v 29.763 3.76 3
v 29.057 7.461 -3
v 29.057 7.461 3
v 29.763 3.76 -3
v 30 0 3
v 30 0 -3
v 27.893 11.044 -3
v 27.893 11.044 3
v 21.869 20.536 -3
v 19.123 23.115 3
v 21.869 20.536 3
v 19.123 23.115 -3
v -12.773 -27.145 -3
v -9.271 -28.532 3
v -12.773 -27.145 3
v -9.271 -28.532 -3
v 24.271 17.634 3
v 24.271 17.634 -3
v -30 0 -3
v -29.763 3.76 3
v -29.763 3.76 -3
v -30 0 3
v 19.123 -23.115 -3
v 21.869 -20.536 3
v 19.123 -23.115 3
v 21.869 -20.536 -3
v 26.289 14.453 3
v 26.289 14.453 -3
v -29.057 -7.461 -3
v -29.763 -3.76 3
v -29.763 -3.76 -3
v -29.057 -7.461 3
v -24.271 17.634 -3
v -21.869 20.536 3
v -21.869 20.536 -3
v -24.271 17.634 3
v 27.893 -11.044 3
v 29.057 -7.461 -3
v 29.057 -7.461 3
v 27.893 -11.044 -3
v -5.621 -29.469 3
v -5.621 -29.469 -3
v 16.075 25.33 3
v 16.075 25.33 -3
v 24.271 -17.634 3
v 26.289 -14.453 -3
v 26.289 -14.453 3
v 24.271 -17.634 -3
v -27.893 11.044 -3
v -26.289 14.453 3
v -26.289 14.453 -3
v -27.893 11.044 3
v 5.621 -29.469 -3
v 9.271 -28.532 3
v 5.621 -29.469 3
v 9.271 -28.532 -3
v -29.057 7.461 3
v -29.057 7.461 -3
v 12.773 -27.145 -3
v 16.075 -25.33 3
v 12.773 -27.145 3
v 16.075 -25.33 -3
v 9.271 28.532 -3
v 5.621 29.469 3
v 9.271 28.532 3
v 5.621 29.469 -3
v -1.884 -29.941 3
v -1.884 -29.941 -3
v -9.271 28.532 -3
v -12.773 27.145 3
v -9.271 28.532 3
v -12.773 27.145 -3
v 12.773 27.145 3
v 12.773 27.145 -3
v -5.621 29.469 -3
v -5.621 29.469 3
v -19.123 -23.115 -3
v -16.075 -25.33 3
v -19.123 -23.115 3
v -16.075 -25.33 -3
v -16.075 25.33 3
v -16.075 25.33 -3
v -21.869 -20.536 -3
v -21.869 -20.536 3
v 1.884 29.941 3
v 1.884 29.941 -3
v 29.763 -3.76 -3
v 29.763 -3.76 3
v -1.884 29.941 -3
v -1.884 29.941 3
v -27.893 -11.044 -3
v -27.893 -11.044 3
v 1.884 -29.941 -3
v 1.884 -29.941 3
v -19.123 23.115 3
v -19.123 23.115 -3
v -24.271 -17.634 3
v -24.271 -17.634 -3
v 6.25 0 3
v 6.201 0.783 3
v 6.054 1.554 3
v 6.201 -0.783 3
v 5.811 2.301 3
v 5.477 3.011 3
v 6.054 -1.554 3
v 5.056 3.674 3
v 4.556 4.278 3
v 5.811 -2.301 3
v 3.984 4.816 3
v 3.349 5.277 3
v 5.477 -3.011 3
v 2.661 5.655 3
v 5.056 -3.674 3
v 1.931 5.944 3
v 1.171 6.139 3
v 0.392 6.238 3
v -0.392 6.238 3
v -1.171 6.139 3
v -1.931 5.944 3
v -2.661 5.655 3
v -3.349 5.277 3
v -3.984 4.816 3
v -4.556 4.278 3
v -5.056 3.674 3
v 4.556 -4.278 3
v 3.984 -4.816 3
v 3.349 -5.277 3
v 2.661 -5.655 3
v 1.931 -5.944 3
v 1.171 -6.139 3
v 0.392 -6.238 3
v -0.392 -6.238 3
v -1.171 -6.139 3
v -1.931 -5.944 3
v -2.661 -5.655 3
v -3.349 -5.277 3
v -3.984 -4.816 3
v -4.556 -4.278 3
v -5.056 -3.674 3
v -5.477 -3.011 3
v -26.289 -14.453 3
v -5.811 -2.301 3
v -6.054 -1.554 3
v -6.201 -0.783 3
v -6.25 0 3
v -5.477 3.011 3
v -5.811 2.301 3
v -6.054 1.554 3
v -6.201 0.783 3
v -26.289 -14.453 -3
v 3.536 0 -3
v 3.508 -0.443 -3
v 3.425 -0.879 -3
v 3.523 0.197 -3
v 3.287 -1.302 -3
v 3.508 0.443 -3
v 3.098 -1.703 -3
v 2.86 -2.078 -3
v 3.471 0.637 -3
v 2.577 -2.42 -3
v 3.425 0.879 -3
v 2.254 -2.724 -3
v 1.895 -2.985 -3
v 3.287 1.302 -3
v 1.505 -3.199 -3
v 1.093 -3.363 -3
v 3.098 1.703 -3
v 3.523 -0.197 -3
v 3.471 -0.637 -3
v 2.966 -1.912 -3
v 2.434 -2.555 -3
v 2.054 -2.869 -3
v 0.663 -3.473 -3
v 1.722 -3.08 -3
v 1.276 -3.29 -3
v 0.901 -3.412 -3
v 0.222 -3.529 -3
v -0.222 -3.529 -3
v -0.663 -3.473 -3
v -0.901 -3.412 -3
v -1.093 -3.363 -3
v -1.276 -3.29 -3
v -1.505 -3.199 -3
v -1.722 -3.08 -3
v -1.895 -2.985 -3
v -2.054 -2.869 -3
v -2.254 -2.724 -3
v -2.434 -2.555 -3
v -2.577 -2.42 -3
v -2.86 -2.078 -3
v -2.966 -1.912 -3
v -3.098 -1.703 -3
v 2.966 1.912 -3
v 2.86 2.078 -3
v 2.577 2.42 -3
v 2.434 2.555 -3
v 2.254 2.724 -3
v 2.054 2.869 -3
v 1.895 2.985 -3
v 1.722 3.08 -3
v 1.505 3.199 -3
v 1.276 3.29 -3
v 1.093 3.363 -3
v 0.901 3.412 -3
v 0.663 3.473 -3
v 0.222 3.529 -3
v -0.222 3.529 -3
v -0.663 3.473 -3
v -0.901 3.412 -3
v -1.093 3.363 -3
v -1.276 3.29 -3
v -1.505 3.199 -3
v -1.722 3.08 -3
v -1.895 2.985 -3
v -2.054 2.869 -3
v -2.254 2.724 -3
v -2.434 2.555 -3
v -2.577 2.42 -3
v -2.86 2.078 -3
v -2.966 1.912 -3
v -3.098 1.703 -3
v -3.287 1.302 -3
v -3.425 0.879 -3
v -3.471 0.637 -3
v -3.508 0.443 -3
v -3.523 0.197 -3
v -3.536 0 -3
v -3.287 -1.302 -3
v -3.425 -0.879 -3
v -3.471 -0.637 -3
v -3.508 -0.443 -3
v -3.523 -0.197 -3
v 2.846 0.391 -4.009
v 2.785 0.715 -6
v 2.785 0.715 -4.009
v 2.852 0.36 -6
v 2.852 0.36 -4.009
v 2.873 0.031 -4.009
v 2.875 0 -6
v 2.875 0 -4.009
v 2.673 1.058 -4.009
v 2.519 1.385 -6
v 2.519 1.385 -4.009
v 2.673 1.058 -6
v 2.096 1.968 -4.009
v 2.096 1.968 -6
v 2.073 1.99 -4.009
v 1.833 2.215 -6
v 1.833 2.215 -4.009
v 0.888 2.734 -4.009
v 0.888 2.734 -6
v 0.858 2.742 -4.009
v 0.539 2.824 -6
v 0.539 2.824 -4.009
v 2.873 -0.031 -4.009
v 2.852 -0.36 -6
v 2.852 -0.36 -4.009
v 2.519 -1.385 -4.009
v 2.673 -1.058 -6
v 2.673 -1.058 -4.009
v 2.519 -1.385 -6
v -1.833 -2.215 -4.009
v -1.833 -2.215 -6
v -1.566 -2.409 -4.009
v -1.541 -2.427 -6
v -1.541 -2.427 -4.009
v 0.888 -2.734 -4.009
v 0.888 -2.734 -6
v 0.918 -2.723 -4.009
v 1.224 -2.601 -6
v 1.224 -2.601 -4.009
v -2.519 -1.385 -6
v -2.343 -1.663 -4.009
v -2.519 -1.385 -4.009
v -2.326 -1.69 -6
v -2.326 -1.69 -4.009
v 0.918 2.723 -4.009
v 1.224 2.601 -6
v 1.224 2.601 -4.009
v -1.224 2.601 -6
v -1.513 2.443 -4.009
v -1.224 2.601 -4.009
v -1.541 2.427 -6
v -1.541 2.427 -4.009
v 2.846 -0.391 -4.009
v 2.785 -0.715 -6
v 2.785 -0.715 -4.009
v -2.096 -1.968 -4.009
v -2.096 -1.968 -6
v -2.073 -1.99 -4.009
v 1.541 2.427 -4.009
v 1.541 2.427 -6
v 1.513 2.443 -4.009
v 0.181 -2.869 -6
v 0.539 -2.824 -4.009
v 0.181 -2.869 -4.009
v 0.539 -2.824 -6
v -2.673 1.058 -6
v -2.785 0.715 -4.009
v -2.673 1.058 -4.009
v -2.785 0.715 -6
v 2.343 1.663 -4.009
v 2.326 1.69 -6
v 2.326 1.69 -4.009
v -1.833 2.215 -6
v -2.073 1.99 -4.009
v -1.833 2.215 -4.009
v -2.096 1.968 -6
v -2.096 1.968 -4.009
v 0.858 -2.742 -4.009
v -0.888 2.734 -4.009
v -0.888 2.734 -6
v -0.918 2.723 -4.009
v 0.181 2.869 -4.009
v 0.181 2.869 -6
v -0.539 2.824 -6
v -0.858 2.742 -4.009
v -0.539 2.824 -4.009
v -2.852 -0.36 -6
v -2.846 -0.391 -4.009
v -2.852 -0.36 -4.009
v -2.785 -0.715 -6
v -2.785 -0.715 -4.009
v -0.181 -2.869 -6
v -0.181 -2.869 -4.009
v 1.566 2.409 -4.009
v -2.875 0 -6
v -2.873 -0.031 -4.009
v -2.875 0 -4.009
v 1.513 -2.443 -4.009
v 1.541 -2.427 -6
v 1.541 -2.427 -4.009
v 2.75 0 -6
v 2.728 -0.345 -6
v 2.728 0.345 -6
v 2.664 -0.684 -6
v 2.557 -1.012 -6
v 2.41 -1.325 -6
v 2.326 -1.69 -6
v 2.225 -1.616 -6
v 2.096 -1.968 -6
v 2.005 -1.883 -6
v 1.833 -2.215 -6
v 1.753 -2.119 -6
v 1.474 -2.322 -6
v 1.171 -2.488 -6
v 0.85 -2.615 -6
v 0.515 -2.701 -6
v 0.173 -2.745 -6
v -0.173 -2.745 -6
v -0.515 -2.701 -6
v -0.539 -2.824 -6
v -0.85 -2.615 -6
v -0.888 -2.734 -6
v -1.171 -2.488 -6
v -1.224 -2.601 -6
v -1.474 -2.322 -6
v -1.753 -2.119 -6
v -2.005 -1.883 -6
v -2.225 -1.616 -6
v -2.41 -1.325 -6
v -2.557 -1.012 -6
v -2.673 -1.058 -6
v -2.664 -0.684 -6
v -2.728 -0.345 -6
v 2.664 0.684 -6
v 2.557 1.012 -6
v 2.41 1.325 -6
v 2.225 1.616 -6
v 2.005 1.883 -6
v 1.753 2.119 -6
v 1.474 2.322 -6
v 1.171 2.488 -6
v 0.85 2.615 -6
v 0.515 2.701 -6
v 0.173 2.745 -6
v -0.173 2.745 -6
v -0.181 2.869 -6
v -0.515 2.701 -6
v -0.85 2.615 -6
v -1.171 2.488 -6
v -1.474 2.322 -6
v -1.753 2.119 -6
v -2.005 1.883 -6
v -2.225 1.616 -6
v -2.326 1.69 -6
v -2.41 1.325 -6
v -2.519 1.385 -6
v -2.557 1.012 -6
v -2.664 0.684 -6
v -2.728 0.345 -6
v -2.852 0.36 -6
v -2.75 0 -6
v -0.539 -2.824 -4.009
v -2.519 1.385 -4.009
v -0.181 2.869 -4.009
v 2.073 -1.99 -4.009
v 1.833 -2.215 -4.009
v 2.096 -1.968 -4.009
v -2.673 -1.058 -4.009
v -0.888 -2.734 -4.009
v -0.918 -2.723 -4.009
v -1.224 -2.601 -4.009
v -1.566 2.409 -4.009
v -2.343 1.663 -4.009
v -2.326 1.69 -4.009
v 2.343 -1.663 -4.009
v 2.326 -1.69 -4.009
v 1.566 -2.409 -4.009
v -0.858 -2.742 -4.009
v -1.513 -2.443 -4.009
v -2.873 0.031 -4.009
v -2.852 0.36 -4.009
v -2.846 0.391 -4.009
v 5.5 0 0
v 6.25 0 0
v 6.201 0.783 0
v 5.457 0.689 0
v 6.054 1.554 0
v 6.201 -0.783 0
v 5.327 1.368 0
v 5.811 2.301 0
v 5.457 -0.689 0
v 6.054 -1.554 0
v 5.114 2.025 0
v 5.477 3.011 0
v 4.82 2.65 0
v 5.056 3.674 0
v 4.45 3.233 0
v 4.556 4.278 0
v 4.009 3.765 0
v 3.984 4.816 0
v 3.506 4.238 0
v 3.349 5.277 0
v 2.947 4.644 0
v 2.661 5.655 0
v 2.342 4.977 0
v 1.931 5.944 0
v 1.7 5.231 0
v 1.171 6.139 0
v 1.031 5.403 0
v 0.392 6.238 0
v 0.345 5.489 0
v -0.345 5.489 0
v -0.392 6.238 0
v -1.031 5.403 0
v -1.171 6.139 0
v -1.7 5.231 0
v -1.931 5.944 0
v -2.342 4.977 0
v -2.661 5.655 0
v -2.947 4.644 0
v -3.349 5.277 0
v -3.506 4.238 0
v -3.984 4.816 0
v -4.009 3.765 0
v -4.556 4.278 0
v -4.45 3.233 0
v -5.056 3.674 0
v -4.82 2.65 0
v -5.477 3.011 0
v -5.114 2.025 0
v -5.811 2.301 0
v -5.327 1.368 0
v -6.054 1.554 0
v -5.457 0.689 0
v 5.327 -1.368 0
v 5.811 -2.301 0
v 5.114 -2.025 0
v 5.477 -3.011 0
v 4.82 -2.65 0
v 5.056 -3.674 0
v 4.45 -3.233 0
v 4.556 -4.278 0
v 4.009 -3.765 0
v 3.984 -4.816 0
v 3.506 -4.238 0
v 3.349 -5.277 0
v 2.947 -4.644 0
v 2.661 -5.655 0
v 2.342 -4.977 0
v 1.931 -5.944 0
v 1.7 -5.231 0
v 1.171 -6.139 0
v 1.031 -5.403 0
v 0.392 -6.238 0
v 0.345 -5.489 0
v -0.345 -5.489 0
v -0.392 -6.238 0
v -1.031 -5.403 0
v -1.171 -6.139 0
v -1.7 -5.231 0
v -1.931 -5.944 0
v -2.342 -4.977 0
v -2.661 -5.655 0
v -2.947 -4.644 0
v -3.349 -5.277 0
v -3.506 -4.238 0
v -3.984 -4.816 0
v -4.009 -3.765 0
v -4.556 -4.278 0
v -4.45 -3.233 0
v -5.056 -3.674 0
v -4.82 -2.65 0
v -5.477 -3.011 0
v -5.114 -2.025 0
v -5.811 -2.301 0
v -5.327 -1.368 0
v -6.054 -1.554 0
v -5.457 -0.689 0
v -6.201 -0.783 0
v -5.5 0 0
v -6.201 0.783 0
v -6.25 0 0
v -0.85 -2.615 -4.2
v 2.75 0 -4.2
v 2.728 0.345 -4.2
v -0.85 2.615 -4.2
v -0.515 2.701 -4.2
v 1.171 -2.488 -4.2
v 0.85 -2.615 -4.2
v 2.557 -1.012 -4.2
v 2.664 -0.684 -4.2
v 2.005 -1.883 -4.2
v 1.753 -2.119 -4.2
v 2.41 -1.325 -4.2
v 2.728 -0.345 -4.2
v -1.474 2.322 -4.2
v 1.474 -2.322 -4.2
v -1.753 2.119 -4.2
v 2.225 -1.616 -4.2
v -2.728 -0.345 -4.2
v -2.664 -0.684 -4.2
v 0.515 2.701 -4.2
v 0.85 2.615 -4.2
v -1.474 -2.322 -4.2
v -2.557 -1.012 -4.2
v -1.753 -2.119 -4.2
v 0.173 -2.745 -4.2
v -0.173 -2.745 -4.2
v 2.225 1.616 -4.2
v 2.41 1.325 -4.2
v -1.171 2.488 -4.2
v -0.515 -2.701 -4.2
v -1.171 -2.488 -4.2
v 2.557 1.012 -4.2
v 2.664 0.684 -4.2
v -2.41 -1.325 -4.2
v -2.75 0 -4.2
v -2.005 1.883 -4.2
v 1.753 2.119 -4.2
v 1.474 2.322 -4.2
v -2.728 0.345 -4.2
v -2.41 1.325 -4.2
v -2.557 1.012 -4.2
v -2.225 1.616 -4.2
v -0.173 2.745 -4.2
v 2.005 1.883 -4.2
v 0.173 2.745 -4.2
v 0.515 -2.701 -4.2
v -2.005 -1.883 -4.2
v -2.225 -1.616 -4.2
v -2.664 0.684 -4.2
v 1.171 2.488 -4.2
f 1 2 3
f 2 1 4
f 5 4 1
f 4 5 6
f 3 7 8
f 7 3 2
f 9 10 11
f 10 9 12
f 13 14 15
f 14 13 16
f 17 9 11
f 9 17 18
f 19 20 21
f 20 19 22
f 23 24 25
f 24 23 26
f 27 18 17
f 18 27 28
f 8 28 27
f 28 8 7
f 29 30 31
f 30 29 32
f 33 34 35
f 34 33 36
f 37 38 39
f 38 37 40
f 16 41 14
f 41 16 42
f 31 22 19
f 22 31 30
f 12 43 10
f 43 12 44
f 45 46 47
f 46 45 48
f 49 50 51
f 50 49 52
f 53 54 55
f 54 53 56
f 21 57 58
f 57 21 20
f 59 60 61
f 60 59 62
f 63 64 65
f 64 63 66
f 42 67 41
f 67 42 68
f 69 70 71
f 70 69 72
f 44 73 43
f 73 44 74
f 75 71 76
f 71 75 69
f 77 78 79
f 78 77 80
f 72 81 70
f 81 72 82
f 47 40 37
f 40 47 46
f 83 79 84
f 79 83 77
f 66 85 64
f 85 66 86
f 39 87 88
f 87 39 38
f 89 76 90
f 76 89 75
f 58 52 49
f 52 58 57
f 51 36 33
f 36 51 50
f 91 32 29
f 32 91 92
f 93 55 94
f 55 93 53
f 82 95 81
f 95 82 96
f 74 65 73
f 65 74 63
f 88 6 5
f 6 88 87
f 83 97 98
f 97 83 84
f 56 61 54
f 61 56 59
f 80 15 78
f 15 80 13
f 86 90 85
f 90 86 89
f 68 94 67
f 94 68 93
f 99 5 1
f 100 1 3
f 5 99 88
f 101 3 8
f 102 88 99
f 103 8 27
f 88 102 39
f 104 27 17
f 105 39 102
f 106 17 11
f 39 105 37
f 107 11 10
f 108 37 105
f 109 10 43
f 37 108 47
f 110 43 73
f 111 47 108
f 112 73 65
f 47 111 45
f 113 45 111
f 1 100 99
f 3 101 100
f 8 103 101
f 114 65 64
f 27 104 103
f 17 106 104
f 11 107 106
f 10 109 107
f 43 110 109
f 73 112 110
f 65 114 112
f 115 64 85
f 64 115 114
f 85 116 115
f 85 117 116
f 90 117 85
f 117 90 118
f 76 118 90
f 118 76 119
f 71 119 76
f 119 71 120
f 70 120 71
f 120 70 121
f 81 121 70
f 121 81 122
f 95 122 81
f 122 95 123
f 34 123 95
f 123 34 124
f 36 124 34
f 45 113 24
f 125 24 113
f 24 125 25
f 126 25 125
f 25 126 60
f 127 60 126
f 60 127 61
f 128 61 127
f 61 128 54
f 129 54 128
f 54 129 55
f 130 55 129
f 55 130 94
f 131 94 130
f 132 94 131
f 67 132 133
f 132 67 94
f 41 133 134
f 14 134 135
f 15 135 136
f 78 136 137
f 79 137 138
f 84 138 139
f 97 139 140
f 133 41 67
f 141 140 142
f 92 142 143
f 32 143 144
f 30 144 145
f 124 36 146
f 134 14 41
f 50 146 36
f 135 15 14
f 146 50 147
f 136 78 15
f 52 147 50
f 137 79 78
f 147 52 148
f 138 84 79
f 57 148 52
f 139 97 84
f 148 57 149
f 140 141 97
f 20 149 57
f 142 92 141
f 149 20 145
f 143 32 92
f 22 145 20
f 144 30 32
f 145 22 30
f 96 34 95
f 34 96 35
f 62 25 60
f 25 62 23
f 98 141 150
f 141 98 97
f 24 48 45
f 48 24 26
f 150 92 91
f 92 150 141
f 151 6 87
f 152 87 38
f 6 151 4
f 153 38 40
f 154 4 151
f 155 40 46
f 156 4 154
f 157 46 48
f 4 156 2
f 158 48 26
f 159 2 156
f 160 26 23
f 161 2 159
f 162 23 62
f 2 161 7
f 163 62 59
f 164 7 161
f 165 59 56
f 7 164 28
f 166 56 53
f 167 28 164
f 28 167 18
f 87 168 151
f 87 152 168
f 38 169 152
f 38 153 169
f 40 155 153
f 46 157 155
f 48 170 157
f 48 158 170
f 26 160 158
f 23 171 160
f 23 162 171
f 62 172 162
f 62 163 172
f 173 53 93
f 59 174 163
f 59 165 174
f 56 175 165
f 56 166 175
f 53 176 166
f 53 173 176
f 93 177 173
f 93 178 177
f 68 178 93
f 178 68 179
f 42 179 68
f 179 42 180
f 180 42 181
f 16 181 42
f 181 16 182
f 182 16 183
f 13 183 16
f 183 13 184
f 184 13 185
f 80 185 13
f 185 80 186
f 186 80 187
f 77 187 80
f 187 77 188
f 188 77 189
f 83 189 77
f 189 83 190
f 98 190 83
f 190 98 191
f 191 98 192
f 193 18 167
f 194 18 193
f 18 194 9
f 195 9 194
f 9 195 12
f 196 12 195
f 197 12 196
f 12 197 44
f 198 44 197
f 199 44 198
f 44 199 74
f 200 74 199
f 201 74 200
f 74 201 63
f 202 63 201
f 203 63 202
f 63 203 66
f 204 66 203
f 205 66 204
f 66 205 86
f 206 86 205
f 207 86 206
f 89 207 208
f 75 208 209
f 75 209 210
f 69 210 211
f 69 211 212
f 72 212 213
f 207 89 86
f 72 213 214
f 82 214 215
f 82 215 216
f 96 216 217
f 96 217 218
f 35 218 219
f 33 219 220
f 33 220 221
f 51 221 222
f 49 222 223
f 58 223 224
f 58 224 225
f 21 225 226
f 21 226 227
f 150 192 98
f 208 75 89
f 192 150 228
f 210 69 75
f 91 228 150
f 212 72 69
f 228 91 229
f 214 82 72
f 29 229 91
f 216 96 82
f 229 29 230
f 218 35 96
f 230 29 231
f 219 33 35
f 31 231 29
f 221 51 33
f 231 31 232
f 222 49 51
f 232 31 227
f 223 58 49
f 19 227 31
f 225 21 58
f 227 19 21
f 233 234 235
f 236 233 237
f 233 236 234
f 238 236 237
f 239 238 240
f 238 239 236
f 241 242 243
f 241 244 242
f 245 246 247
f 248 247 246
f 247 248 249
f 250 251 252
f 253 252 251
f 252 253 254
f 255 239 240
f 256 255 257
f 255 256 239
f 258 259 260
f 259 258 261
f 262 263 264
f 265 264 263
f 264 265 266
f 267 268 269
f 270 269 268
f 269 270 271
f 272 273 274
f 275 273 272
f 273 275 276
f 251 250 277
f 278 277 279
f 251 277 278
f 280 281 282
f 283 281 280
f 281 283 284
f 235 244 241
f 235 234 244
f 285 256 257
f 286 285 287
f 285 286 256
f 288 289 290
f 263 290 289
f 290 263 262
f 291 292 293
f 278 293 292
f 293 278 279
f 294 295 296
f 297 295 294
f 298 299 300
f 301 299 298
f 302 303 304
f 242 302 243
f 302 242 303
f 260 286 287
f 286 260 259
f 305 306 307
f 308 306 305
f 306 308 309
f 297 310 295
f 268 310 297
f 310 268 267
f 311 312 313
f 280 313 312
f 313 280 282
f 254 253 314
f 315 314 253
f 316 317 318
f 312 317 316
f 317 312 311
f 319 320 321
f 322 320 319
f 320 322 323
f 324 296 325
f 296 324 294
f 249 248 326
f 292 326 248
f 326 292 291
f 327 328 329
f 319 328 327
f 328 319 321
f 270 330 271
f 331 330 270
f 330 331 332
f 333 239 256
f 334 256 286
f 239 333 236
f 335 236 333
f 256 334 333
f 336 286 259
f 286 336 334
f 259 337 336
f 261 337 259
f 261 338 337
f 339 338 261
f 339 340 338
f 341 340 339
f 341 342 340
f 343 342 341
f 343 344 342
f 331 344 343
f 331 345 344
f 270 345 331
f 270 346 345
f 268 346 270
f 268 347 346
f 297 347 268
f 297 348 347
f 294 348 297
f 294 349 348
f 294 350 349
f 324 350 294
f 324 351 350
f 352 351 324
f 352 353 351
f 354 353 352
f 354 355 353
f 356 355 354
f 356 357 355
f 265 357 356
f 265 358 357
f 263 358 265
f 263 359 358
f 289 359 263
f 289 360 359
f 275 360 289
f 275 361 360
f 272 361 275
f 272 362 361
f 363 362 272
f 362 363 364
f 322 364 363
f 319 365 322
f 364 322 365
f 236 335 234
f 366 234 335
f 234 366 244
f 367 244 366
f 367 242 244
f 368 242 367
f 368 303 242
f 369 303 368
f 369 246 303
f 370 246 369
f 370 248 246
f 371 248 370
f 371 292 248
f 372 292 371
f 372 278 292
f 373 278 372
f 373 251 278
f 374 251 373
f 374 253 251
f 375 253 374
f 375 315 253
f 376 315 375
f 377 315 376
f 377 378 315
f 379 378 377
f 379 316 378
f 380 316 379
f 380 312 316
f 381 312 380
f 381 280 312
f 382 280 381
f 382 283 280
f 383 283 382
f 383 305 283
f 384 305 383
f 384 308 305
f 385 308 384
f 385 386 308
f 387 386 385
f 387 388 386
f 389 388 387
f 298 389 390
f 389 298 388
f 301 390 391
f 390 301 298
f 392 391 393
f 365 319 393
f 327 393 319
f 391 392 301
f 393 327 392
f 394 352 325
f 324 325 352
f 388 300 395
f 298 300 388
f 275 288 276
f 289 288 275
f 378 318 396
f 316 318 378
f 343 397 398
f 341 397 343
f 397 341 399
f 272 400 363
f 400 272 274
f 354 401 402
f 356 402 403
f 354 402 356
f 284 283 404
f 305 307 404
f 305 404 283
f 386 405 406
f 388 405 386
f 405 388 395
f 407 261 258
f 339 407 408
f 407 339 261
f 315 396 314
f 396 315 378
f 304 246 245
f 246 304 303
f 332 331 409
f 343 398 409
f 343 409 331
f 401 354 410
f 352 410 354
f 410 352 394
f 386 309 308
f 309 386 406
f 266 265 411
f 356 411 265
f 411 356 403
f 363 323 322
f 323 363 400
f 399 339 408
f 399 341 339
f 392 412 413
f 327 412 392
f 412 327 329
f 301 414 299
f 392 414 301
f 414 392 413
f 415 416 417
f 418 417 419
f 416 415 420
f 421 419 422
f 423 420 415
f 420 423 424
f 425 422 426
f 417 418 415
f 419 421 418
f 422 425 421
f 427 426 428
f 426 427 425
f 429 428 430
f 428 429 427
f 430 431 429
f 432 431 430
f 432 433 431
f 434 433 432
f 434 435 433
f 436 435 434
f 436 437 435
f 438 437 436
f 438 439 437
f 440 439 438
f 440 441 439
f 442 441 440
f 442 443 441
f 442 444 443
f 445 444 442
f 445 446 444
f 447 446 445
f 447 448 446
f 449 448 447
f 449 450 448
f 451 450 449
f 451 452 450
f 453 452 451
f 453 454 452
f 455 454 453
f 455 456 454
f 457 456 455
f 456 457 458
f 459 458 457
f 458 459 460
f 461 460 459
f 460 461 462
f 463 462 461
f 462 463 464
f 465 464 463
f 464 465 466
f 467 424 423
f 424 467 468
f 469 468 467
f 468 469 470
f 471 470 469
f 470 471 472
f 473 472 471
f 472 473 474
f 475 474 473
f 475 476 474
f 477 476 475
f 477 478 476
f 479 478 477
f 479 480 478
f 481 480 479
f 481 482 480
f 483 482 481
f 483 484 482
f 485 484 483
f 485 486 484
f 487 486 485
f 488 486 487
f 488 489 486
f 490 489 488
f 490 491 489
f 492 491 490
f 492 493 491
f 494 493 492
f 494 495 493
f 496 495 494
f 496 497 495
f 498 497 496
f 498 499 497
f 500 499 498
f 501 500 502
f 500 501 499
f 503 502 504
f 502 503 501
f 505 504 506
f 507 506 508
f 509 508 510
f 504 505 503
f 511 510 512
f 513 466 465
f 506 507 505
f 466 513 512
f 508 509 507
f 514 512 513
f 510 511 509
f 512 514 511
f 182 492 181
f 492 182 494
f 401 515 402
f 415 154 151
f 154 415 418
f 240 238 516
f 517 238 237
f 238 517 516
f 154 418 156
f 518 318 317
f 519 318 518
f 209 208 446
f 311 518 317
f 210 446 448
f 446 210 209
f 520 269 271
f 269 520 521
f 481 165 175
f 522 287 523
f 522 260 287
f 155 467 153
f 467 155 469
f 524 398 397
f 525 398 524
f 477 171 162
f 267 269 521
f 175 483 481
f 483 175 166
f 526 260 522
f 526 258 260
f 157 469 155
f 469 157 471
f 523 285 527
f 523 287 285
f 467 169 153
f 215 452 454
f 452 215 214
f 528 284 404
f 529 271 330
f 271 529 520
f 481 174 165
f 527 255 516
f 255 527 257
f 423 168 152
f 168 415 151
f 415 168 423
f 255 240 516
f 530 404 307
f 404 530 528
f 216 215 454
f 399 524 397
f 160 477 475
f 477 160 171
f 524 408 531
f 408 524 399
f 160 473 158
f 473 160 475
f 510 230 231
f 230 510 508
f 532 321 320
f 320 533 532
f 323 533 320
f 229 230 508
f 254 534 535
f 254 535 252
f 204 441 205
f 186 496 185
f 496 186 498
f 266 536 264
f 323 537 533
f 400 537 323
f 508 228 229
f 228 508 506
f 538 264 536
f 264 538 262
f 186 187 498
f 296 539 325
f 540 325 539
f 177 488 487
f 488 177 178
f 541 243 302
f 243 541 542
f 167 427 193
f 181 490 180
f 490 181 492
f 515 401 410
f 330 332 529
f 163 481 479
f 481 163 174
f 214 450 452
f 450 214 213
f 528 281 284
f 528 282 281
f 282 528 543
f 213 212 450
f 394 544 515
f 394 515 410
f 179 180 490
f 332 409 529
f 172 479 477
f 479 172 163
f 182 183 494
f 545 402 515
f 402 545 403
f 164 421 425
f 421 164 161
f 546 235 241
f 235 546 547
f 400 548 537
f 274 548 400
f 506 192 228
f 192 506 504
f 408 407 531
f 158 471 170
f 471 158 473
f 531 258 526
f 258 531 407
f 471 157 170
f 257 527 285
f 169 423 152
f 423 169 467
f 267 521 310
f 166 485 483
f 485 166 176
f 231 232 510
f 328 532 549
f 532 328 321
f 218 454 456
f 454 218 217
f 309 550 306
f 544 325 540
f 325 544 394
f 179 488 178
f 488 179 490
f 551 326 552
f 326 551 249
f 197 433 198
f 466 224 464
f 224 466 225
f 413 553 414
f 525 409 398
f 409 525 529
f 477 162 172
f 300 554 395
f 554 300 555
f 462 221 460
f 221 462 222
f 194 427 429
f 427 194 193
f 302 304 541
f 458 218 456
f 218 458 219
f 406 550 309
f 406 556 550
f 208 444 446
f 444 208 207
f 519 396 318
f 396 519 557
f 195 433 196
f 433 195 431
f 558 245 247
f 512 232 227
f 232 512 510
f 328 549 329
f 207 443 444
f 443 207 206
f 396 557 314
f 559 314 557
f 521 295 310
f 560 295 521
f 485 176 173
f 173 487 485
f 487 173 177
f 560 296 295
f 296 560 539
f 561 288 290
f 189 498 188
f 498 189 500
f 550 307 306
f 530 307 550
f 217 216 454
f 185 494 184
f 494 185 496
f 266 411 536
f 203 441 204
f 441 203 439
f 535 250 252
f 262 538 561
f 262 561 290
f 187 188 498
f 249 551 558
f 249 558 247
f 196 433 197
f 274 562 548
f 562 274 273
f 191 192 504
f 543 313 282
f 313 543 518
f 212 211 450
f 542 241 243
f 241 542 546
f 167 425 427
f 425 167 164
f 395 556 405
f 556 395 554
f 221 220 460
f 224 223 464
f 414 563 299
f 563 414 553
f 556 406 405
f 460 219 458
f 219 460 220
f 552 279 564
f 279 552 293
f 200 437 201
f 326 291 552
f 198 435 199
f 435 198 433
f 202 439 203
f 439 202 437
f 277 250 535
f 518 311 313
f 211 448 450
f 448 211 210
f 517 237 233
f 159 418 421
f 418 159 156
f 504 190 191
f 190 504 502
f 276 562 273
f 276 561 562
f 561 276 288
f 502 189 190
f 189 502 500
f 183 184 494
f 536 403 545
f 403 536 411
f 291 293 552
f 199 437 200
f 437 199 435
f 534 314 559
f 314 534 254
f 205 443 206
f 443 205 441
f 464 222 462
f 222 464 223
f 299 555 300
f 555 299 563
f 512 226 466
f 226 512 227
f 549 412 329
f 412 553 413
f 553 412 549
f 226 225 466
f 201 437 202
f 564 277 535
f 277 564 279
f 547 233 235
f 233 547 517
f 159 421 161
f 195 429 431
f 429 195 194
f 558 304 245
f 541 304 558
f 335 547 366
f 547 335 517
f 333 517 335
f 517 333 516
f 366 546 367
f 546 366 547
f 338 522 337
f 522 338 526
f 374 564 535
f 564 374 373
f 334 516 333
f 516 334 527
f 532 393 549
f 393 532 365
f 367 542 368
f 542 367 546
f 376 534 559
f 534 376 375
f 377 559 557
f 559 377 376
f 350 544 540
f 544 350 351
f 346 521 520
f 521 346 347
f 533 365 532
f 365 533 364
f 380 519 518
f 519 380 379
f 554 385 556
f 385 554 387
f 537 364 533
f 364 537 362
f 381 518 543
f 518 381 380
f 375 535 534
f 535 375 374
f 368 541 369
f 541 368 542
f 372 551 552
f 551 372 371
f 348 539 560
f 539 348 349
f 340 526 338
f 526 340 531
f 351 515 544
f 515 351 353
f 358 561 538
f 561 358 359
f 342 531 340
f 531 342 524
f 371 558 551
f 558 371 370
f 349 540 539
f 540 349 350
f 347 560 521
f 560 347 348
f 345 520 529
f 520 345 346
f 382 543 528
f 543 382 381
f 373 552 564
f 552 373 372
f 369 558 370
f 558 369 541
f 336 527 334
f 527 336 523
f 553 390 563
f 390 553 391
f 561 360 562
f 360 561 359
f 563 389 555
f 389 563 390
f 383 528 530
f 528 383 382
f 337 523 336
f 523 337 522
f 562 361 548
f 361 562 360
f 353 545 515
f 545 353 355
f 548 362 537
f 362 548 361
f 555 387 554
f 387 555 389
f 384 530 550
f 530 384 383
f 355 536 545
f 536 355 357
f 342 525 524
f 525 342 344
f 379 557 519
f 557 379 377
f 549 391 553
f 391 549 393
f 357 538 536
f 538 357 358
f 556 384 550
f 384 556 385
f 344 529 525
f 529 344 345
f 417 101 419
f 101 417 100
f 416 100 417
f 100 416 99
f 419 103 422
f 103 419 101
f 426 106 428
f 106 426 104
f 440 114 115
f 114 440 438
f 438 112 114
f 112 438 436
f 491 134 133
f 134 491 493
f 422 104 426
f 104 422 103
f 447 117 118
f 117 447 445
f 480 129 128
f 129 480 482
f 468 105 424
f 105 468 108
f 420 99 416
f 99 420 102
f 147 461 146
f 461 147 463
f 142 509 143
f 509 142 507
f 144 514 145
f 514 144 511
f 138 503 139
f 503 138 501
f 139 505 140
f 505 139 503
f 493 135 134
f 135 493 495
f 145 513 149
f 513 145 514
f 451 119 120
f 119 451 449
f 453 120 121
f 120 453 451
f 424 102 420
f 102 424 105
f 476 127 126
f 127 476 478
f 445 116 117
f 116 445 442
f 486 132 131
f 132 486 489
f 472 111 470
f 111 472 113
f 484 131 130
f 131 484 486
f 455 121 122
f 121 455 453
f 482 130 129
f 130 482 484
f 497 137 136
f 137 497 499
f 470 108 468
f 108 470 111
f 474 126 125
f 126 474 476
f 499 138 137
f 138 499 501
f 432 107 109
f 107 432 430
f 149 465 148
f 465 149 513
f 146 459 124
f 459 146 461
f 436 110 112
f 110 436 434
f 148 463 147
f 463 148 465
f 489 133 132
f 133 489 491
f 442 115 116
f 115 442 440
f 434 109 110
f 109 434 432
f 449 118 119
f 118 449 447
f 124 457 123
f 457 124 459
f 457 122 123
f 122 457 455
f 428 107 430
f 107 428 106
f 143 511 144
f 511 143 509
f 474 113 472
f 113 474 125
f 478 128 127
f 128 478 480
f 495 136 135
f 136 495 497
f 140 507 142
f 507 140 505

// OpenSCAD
$fn = 50;


difference() {
	union() {
		translate(v = [0, 0, -3.0000000000]) {
			cylinder(h = 6, r = 30.0000000000);
		}
		#translate(v = [0, 0, -6.0000000000]) {
			cylinder(h = 6, r = 2.8750000000);
		}
	}
	union() {
		translate(v = [0, 0, 0]) {
			rotate(a = [0, 0, 0]) {
				difference() {
					union() {
						translate(v = [0, 0, -6.0000000000]) {
							cylinder(h = 6, r = 2.2500000000);
						}
						translate(v = [0, 0, -4.2000000000]) {
							cylinder(h = 4.2000000000, r1 = 2.7500000000, r2 = 5.5000000000);
						}
						translate(v = [0, 0, -6.0000000000]) {
							cylinder(h = 6, r = 2.7500000000);
						}
						translate(v = [0, 0, -6.0000000000]) {
							cylinder(h = 6, r = 2.2500000000);
						}
					}
					union();
				}
			}
		}
		#cylinder(h = 3, r = 6.2500000000);
	}
}
